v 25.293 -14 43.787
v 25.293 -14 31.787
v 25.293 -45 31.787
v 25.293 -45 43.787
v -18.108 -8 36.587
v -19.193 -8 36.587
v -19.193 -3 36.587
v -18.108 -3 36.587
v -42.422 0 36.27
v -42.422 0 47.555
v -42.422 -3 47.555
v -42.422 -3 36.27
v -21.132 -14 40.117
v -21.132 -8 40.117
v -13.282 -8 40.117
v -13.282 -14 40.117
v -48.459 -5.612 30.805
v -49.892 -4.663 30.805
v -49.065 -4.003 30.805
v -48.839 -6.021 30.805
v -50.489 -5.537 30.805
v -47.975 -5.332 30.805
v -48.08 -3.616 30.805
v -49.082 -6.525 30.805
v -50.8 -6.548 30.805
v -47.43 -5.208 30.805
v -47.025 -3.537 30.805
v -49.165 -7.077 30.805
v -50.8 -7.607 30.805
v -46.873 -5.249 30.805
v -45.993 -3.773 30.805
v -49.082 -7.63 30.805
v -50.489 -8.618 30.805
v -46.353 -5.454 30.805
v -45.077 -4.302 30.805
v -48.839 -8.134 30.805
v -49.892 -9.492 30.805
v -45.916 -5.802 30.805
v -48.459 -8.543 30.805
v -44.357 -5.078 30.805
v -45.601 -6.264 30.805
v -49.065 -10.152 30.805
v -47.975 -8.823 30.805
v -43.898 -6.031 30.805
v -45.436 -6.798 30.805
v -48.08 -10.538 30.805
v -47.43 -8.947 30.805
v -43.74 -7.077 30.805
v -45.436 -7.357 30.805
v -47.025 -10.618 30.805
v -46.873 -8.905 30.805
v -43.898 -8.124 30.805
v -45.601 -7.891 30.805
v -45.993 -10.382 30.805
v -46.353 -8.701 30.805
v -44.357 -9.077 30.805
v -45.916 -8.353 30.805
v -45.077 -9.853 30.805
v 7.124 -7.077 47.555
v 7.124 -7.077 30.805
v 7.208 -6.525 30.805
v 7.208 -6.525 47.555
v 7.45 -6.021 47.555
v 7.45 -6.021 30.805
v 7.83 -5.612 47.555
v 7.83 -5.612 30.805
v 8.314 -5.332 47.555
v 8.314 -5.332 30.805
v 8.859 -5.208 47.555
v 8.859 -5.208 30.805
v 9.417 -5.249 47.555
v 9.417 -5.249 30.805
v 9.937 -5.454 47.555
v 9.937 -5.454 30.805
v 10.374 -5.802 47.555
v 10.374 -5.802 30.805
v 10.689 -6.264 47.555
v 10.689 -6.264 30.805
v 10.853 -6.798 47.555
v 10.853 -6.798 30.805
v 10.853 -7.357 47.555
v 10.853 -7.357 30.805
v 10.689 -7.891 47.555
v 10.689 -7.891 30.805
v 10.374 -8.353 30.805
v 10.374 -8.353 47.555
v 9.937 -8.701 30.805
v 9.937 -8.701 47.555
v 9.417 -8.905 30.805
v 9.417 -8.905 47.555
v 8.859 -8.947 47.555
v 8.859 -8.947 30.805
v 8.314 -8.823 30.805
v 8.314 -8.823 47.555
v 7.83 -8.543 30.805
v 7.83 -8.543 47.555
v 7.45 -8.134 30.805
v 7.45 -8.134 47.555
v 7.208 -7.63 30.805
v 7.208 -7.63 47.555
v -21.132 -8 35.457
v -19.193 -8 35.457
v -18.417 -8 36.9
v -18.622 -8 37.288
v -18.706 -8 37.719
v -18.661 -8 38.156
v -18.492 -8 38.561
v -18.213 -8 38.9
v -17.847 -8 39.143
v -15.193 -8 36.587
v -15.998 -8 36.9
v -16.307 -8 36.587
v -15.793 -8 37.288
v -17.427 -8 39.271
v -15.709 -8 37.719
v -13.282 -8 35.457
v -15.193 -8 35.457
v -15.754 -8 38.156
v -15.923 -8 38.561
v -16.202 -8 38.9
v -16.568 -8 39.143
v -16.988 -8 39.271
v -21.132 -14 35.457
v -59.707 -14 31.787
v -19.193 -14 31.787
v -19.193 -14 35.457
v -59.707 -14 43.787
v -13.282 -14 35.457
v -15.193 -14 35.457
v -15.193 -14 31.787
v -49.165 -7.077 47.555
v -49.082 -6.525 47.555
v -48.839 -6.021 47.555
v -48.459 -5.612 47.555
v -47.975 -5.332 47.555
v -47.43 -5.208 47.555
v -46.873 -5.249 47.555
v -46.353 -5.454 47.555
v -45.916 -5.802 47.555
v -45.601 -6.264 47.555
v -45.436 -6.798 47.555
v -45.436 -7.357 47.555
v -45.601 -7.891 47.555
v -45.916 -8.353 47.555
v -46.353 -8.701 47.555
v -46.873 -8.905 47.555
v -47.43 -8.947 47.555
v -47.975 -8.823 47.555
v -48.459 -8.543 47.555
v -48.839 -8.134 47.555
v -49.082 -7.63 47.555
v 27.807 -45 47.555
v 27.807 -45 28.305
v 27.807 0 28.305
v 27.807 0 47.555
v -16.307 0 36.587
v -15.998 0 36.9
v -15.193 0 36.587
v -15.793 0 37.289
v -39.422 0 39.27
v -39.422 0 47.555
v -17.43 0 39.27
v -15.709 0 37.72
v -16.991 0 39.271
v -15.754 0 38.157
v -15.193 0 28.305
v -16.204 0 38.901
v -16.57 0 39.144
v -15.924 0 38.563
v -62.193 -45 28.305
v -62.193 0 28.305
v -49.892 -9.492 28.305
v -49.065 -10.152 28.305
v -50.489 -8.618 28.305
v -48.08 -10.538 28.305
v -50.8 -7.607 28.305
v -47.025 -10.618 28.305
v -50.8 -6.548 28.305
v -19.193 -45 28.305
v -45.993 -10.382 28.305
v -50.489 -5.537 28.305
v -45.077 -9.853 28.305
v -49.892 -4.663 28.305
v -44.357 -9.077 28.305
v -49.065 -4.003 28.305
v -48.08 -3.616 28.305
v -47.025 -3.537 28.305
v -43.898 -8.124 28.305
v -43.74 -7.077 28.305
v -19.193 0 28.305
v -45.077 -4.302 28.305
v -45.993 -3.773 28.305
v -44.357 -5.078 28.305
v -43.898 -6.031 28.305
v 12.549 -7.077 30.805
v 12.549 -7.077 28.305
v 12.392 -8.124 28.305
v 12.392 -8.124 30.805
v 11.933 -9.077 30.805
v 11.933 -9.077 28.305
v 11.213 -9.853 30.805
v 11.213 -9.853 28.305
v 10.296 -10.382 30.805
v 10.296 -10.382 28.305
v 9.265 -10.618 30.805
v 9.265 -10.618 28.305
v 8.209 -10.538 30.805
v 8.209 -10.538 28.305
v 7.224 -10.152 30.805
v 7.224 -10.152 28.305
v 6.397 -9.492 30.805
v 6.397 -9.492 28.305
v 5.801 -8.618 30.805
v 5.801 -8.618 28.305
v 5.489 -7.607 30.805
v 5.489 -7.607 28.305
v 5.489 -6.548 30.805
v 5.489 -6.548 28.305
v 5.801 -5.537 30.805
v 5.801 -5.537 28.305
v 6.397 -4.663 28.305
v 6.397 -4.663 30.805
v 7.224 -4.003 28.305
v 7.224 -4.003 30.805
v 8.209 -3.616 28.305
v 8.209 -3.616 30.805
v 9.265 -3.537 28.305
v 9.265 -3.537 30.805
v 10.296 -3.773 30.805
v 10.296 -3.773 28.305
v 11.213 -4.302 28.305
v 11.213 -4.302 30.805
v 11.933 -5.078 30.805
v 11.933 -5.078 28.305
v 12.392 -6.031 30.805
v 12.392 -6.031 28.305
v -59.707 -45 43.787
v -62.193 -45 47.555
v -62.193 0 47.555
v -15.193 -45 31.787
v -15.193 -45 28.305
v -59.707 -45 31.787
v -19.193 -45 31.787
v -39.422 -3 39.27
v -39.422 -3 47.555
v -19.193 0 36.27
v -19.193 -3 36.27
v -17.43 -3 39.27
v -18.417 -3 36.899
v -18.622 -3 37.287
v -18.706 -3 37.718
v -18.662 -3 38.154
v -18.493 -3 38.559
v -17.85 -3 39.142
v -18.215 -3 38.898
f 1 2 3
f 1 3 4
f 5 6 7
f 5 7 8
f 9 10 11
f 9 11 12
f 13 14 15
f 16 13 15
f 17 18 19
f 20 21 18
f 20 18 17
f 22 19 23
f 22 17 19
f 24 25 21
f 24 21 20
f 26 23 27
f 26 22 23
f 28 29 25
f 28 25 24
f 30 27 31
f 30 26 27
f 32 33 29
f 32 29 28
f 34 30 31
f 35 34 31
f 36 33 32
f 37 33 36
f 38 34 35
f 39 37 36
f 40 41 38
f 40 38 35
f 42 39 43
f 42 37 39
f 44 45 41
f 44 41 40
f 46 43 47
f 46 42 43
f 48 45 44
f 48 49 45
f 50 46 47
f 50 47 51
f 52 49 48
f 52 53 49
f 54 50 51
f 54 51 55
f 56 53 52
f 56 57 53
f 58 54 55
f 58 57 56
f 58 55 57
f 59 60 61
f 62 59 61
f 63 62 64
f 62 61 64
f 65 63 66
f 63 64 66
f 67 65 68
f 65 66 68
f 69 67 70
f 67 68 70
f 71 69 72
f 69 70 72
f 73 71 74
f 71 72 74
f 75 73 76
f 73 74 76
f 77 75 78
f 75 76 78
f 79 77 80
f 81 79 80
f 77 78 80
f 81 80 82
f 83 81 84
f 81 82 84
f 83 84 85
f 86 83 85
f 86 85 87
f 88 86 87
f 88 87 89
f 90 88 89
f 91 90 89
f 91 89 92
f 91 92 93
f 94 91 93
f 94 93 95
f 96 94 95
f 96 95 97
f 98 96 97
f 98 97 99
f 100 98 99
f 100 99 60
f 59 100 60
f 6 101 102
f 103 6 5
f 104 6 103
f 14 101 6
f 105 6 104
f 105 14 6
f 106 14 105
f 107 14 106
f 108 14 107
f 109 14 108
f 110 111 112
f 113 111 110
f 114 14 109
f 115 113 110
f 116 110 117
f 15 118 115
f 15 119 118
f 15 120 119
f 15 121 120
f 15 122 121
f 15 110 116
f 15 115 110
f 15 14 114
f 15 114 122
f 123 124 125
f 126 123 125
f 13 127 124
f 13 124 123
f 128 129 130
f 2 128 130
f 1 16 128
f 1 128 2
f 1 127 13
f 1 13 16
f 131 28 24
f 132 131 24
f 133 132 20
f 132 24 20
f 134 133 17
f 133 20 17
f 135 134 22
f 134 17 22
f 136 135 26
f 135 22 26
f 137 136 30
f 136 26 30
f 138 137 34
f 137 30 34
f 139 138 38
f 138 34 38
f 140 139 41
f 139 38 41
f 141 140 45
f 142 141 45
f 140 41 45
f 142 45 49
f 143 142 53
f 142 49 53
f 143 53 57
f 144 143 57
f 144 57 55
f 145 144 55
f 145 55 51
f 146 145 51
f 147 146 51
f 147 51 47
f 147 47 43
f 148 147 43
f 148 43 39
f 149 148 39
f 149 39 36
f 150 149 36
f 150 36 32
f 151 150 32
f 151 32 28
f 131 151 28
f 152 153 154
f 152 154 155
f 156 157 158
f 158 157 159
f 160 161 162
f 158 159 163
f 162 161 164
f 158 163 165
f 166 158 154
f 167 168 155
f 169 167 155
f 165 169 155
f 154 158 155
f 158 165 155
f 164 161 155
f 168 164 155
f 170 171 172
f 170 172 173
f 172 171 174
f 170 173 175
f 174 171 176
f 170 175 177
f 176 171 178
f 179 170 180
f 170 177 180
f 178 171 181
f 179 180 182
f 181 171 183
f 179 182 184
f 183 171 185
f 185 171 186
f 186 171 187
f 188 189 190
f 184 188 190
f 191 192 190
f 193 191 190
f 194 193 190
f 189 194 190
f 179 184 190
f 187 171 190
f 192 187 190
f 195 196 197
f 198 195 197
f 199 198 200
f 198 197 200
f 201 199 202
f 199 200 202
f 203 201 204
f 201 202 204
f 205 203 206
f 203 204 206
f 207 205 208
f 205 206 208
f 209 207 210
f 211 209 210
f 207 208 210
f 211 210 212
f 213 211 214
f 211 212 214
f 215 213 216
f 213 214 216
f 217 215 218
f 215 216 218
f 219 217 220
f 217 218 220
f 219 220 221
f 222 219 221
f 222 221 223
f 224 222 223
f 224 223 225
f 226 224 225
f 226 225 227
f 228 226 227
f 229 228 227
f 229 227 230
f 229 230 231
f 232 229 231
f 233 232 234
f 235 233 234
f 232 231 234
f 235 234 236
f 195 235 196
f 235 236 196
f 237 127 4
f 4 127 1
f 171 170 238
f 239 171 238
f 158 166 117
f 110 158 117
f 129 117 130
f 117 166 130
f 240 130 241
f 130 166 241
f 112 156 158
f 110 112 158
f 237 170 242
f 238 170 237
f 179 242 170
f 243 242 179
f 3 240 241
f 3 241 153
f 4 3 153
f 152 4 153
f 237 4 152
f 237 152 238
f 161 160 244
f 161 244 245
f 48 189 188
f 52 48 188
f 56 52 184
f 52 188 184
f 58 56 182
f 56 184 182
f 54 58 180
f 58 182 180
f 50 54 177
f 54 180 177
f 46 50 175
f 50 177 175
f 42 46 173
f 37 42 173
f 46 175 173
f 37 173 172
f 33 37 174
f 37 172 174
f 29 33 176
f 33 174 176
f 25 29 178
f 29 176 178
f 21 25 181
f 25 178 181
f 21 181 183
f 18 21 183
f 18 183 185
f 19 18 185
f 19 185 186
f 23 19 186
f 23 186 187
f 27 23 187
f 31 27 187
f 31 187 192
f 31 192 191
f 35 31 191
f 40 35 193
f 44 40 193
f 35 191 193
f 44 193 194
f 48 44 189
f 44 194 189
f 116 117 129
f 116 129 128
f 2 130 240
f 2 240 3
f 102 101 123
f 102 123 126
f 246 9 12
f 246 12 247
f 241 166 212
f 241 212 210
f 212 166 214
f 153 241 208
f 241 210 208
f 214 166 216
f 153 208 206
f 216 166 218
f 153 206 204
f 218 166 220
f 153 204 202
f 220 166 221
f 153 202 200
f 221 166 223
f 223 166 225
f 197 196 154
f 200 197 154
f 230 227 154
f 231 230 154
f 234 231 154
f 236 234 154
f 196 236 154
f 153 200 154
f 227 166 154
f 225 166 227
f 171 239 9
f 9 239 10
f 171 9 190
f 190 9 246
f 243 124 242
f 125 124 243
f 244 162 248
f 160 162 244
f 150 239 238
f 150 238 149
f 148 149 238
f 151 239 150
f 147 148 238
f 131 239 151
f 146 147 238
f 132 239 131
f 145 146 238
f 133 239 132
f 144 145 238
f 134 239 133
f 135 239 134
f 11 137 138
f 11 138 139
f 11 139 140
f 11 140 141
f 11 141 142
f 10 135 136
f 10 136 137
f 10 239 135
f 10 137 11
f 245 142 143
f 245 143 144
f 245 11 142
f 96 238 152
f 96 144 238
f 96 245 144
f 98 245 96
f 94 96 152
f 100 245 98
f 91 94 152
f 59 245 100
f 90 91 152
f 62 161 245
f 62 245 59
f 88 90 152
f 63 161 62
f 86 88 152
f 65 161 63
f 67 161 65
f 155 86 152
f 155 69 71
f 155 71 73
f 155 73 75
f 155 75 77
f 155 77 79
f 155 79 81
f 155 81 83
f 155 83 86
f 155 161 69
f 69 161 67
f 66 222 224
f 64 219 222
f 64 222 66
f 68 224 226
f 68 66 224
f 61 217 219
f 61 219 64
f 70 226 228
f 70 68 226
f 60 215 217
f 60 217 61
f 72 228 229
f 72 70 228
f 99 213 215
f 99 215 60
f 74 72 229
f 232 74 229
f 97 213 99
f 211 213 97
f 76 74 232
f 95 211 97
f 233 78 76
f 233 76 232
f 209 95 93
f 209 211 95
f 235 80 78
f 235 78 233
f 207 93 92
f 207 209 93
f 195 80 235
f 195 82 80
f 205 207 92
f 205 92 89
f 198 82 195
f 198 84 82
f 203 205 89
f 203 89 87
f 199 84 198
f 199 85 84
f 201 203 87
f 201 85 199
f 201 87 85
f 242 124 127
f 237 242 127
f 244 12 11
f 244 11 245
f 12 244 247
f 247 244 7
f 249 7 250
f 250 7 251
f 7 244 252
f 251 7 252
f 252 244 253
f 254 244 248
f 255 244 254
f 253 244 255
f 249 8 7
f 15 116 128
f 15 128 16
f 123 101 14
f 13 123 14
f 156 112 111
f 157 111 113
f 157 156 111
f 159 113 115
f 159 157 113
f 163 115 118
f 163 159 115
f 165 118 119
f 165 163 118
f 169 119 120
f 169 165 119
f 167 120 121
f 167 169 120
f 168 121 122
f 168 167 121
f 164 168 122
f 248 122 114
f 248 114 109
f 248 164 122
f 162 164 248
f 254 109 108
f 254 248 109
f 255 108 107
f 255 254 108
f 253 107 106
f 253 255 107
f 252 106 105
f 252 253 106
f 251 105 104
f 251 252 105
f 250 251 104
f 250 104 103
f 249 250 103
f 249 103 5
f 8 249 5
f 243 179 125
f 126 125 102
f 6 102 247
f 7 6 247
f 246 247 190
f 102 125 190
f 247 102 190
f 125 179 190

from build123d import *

# Parameters (mm, degrees)
F0_W      = 90
F0_H      = 19.25
F0_W_2    = 85
F0_H_2    = 12
F1_DEPTH  = 45
F0_W_3    = 7.85
F0_H_3    = 4.66
F2_DEPTH  = 14
F0_R      = 1.5
F3_DEPTH  = 8
F5_W      = 4
F5_H      = 29.0582341515
F6_DEPTH  = 3.07077
F5_H_2    = 15.9417658485
F7_DEPTH  = 8.2825263962
F11_DEPTH = 23.33121
F12_DEPTH = 2.5
F14_W     = 3
F14_H     = 4.4074529409
F14_W_2   = 3.907799057
F14_H_2   = 3
F15_DEPTH = 3


with BuildPart() as f1:
    # F0 (on Front) → F1 (new body)
    with BuildSketch(Plane.XZ):
        with Locations((-17.1932545304, 37.9297346771)):
            Rectangle(F0_W, F0_H)
        with Locations((-17.2074458234, 37.7867133319)):
            Rectangle(F0_W_2, F0_H_2, mode=Mode.SUBTRACT)
    extrude(amount=F1_DEPTH)

    # F0 (on Front) → F2 (join)
    with BuildSketch(Plane.XZ):
        with Locations((-17.2074458234, 37.7867133319)):
            Rectangle(F0_W_2, F0_H_2)
        with Locations((-17.2074458234, 37.7867133319)):
            Rectangle(F0_W_3, F0_H_3, mode=Mode.SUBTRACT)
    extrude(amount=F2_DEPTH)

    # F0 (on Front) → F3 (join)
    with BuildSketch(Plane.XZ):
        with Locations((-17.2074458234, 37.7867133319)):
            Rectangle(F0_W_3, F0_H_3)
        with Locations((-17.2074458234, 37.7867133319)):
            Circle(F0_R, mode=Mode.SUBTRACT)
    extrude(amount=F3_DEPTH)

    # F5 (on offset) → F6 (cut)
    with BuildSketch(Plane(origin=(0, 0, 28.3047346771), x_dir=(1, 0, 0), z_dir=(0, 0, -1))):
        with Locations((-17.1932545304, 30.4708829243)):
            Rectangle(F5_W, F5_H)
    extrude(amount=-F6_DEPTH, mode=Mode.SUBTRACT)

    # F5 (on offset) → F7 (cut)
    with BuildSketch(Plane(origin=(0, 0, 28.3047346771), x_dir=(1, 0, 0), z_dir=(0, 0, -1))):
        with Locations((-17.1932545304, 30.4708829243)):
            Rectangle(F5_W, F5_H)
        with Locations((-17.1932545304, 7.9708829243)):
            Rectangle(F5_W, F5_H_2)
    extrude(amount=-F7_DEPTH, mode=Mode.SUBTRACT)

    # F10 (on offset) → F11 (cut)
    with BuildSketch(Plane(origin=(0, 0, 28.3047346771), x_dir=(1, 0, 0), z_dir=(0, 0, -1))):
        with BuildLine():
            Line((-49.1650958551, 7.0774606429), (-45.4150958551, 7.0774606429))
            ThreePointArc((-45.4150958551, 7.0774606429), (-47.2900958551, 8.9524606429), (-49.1650958551, 7.0774606429))
        make_face()
        with BuildLine():
            ThreePointArc((-49.1650958551, 7.0774606429), (-47.2900958551, 5.2024606429), (-45.4150958551, 7.0774606429))
            Line((-45.4150958551, 7.0774606429), (-49.1650958551, 7.0774606429))
        make_face()
        with BuildLine():
            ThreePointArc((10.8743589147, 7.0774606429), (8.9993589147, 8.9524606429), (7.1243589147, 7.0774606429))
            Line((7.1243589147, 7.0774606429), (10.8743589147, 7.0774606429))
        make_face()
        with BuildLine():
            Line((10.8743589147, 7.0774606429), (7.1243589147, 7.0774606429))
            ThreePointArc((7.1243589147, 7.0774606429), (8.9993589147, 5.2024606429), (10.8743589147, 7.0774606429))
        make_face()
    extrude(amount=-F11_DEPTH, mode=Mode.SUBTRACT)

    # F10 (on offset) → F12 (cut)
    with BuildSketch(Plane(origin=(0, 0, 28.3047346771), x_dir=(1, 0, 0), z_dir=(0, 0, -1))):
        with BuildLine():
            Line((7.1243589147, 7.0774606429), (5.4493589147, 7.0774606429))
            ThreePointArc((5.4493589147, 7.0774606429), (8.9993589147, 3.5274606429), (12.5493589147, 7.0774606429))
            Line((12.5493589147, 7.0774606429), (10.8743589147, 7.0774606429))
            ThreePointArc((10.8743589147, 7.0774606429), (8.9993589147, 5.2024606429), (7.1243589147, 7.0774606429))
        make_face()
        with BuildLine():
            ThreePointArc((12.5493589147, 7.0774606429), (8.9993589147, 10.6274606429), (5.4493589147, 7.0774606429))
            Line((5.4493589147, 7.0774606429), (7.1243589147, 7.0774606429))
            ThreePointArc((7.1243589147, 7.0774606429), (8.9993589147, 8.9524606429), (10.8743589147, 7.0774606429))
            Line((10.8743589147, 7.0774606429), (12.5493589147, 7.0774606429))
        make_face()
        with BuildLine():
            Line((-43.7400958551, 7.0774606429), (-45.4150958551, 7.0774606429))
            ThreePointArc((-45.4150958551, 7.0774606429), (-47.2900958551, 5.2024606429), (-49.1650958551, 7.0774606429))
            Line((-49.1650958551, 7.0774606429), (-50.8400958551, 7.0774606429))
            ThreePointArc((-50.8400958551, 7.0774606429), (-47.2900958551, 3.5274606429), (-43.7400958551, 7.0774606429))
        make_face()
        with BuildLine():
            ThreePointArc((-49.1650958551, 7.0774606429), (-47.2900958551, 8.9524606429), (-45.4150958551, 7.0774606429))
            Line((-45.4150958551, 7.0774606429), (-43.7400958551, 7.0774606429))
            ThreePointArc((-43.7400958551, 7.0774606429), (-47.2900958551, 10.6274606429), (-50.8400958551, 7.0774606429))
            Line((-50.8400958551, 7.0774606429), (-49.1650958551, 7.0774606429))
        make_face()
    extrude(amount=-F12_DEPTH, mode=Mode.SUBTRACT)

    # F14 (on face) → F15 (cut)
    with BuildSketch(Plane.XZ):
        Polygon((-21.1324458234, 36.2700645477), (-21.1324458234, 39.2700645477), (-39.4217026339, 39.2700645477), (-39.4217026339, 43.7867133319), (-42.4217026339, 43.7867133319), (-42.4217026339, 39.2700645477), (-42.4217026339, 36.2700645477), (-39.4217026339, 36.2700645477), align=None)
        with Locations((-40.9217026339, 45.9904398024)):
            Rectangle(F14_W, F14_H)
        with Locations((-19.1785462949, 37.7700645477)):
            Rectangle(F14_W_2, F14_H_2)
    extrude(amount=F15_DEPTH, mode=Mode.SUBTRACT)


solid = f1.part
